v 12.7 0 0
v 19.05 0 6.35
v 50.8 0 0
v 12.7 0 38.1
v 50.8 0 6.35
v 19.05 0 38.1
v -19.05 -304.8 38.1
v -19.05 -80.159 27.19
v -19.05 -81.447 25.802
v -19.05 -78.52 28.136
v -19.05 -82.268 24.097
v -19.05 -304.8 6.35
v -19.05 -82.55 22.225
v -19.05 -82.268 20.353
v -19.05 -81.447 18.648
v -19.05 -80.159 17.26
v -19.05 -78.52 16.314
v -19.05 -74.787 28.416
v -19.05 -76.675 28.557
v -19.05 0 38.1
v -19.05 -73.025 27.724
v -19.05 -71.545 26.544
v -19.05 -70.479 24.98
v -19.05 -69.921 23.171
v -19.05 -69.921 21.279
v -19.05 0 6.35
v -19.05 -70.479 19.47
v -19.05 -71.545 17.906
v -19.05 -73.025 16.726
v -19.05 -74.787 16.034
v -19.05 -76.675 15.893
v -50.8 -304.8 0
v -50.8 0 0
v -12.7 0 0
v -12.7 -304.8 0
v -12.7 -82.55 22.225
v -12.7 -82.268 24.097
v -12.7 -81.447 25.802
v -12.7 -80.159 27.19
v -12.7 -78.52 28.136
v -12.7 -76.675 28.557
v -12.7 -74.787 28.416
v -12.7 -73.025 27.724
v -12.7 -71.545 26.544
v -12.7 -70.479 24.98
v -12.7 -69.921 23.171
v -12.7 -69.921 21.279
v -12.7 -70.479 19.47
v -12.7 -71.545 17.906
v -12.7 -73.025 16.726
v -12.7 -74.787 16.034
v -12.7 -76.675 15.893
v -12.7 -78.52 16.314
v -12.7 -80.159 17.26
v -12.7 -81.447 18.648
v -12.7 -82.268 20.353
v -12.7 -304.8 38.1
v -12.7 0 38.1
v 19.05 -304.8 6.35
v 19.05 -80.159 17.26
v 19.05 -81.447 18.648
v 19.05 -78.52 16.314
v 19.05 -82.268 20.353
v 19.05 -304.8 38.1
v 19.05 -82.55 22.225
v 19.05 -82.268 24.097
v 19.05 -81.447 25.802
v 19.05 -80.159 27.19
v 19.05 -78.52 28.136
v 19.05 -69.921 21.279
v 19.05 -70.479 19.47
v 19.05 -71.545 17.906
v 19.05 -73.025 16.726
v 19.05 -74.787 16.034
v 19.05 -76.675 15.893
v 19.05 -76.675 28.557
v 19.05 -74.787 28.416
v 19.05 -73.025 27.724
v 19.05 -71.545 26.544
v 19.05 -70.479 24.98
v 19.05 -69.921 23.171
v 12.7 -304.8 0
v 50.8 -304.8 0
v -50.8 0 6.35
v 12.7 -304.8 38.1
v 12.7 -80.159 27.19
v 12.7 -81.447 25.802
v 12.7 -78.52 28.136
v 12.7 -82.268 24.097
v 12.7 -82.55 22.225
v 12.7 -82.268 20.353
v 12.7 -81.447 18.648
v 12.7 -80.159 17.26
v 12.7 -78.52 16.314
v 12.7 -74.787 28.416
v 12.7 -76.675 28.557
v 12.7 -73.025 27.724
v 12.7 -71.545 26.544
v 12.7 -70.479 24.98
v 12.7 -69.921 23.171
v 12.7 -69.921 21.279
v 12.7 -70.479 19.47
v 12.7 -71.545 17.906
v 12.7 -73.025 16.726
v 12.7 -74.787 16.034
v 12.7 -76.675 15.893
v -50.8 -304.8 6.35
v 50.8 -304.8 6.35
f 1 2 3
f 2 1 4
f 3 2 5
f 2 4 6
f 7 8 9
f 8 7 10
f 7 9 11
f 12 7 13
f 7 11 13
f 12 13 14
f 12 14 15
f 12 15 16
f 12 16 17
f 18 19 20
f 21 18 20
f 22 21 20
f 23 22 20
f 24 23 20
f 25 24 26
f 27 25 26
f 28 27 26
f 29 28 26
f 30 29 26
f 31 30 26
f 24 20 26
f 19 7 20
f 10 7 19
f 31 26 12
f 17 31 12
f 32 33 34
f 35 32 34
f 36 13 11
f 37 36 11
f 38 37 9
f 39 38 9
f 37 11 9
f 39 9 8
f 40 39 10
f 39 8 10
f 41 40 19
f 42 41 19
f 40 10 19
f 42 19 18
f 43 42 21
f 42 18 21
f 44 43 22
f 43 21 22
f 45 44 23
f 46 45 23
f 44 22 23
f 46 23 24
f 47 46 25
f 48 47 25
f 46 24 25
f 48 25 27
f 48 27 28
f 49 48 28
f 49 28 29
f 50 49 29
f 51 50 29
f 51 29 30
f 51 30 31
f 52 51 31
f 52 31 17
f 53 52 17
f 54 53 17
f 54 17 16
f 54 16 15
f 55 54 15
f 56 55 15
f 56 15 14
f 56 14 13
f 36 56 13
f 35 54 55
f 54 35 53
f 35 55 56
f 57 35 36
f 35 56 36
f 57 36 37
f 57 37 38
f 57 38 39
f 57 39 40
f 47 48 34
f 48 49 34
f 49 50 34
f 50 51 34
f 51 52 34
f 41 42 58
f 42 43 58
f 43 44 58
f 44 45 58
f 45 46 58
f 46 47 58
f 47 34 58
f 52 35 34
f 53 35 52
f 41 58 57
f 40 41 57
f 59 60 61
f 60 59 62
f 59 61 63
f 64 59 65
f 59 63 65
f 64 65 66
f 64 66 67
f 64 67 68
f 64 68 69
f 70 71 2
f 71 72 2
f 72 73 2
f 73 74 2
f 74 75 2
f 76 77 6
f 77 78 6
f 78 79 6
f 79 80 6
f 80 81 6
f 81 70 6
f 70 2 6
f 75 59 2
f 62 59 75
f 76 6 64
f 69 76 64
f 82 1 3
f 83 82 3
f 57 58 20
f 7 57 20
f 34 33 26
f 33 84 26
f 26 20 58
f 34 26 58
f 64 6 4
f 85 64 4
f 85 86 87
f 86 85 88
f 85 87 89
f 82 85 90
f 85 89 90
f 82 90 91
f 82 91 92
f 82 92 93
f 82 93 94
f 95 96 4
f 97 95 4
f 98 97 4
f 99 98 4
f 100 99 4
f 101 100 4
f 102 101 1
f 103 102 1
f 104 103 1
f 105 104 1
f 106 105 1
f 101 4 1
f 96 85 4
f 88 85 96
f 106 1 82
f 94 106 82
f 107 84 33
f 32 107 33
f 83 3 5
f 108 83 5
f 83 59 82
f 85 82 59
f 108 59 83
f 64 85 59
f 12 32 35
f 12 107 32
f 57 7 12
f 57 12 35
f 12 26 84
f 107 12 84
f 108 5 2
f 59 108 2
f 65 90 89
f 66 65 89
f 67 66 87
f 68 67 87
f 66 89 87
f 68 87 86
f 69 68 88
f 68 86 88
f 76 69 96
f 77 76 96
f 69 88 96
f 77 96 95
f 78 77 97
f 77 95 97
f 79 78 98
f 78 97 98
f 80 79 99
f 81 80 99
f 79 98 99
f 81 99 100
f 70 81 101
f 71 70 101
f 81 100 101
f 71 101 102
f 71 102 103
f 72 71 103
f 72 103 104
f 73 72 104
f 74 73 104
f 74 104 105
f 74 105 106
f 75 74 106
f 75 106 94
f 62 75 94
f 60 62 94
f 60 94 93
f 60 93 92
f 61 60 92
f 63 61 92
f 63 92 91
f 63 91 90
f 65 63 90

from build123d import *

# Parameters (mm, degrees)
F1_DEPTH = 304.8
F3_D     = 12.7


with BuildPart() as f1:
    # F0 (on Front) → F1 (new body)
    with BuildSketch(Plane.XZ):
        Polygon((-50.8, 0), (-12.7, 0), (-12.7, 38.1), (-19.05, 38.1), (-19.05, 6.35), (-50.8, 6.35), align=None)
        Polygon((12.7, 38.1), (12.7, 0), (50.8, 0), (50.8, 6.35), (19.05, 6.35), (19.05, 38.1), align=None)
    extrude(amount=F1_DEPTH)

    # F3 (through all)
    with Locations(Plane.YZ.offset(19.05)):
        with Locations((-76.2, 22.225)):
            Hole(F3_D / 2)


solid = f1.part
